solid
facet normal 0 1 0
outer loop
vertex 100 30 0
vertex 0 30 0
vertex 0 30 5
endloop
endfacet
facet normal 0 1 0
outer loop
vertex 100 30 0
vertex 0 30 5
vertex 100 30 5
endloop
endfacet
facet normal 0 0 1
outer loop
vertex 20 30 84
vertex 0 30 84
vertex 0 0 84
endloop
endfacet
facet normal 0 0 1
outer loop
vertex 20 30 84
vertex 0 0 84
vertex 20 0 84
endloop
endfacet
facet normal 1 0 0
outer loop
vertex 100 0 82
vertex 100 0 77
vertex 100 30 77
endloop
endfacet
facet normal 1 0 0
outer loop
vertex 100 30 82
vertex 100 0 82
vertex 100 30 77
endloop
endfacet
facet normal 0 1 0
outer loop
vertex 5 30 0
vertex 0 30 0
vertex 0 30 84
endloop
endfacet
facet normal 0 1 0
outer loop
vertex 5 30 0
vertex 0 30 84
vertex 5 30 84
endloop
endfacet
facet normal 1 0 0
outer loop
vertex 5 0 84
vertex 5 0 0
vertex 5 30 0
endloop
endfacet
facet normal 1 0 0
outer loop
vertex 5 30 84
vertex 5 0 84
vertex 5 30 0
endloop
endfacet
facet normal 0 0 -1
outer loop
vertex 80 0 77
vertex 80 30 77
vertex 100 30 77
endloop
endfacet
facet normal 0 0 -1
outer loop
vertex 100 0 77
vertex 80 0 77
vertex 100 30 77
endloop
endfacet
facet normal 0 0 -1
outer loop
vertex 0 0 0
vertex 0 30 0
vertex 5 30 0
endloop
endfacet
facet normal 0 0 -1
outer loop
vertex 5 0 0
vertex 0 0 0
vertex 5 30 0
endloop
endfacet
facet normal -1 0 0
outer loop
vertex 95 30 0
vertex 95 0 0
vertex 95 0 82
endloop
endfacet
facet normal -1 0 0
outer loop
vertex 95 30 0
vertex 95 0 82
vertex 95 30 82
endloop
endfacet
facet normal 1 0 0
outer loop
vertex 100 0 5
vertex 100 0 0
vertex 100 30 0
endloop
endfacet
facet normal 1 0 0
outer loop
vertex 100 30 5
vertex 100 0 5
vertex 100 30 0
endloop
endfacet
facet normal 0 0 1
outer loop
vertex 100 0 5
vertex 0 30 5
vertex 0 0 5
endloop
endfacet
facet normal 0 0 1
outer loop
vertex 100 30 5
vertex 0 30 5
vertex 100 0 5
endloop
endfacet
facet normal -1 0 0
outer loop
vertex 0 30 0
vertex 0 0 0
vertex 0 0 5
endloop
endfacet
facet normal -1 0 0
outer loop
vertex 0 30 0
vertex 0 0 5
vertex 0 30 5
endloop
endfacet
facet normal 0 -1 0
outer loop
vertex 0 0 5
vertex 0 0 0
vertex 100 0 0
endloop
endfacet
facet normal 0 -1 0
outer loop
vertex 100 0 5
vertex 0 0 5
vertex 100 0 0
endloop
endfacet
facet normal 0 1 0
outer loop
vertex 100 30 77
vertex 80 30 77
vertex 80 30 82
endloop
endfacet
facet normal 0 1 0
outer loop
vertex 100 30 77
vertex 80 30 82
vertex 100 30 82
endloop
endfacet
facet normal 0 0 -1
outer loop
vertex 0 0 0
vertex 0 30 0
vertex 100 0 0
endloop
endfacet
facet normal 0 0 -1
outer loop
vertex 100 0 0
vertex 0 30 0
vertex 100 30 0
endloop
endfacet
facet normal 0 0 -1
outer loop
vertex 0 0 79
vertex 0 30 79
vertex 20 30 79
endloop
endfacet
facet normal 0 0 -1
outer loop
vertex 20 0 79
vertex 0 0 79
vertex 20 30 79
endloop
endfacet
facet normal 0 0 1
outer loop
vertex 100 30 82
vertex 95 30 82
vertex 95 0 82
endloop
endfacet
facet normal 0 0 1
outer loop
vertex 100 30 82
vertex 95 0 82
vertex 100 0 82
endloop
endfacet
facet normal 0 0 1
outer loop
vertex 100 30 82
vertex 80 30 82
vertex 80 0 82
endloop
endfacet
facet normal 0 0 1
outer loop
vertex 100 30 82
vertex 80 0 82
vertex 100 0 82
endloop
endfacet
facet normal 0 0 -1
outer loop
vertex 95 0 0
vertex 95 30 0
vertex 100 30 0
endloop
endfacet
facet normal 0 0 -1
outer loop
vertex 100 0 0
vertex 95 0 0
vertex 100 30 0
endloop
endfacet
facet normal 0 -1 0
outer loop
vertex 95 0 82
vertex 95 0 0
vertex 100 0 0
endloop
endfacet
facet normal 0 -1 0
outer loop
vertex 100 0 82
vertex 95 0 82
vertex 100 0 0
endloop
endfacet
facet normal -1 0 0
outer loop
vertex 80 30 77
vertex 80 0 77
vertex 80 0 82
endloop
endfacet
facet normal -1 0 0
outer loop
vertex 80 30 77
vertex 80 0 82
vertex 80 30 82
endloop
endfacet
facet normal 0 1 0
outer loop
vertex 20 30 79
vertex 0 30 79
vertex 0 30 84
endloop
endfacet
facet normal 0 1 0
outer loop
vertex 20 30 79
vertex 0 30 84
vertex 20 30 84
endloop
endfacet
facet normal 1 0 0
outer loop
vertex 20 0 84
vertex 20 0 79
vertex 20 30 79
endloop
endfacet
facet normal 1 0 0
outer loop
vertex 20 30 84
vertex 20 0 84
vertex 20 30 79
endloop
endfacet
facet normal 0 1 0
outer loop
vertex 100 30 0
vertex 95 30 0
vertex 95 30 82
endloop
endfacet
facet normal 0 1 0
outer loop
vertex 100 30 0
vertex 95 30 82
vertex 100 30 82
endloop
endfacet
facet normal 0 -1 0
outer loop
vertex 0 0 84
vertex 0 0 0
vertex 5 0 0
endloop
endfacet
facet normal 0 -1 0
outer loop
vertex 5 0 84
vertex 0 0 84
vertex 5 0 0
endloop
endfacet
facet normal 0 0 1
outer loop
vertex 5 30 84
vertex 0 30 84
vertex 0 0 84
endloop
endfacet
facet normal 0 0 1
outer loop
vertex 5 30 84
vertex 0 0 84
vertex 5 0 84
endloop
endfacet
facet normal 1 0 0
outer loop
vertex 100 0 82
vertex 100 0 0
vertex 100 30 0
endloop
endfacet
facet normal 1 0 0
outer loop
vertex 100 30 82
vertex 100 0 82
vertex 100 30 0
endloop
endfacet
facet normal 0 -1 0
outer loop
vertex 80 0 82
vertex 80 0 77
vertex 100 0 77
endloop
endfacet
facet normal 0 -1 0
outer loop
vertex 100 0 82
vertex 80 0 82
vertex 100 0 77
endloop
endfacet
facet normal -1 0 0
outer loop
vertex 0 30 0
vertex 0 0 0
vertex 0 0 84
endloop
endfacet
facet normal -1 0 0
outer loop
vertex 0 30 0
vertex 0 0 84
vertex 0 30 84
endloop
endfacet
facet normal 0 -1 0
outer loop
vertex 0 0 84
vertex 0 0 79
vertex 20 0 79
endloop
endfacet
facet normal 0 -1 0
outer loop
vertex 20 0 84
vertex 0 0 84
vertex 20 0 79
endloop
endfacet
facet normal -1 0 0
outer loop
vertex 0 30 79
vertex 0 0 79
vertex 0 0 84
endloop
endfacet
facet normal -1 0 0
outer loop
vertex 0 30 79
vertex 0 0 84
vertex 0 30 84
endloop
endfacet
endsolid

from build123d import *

# Parameters (mm, degrees)
BOX_W        = 100
BOX_H        = 30
BOX_DEPTH    = 5
BOX001_W     = 5
BOX001_H     = 30
BOX001_DEPTH = 84
BOX002_W     = 5
BOX002_H     = 30
BOX002_DEPTH = 82
BOX003_W     = 20
BOX003_H     = 30
BOX003_DEPTH = 5
BOX004_W     = 20
BOX004_H     = 30
BOX004_DEPTH = 5


with BuildPart() as base:
    # Box → Box (new body)
    with BuildSketch(Plane.XY):
        with Locations((50, 15)):
            Rectangle(BOX_W, BOX_H)
    extrude(amount=BOX_DEPTH)


with BuildPart() as side_reciever:
    # Box001 → Box001 (new body)
    with BuildSketch(Plane.XY):
        with Locations((2.5, 15)):
            Rectangle(BOX001_W, BOX001_H)
    extrude(amount=BOX001_DEPTH)


with BuildPart() as side_laser:
    # Box002 → Box002 (new body)
    with BuildSketch(Plane(origin=(95, 0, 0), x_dir=(1, 0, 0), z_dir=(0, 0, 1))):
        with Locations((2.5, 15)):
            Rectangle(BOX002_W, BOX002_H)
    extrude(amount=BOX002_DEPTH)


with BuildPart() as platform_laser:
    # Box003 → Box003 (new body)
    with BuildSketch(Plane(origin=(80, 0, 77), x_dir=(1, 0, 0), z_dir=(0, 0, 1))):
        with Locations((10, 15)):
            Rectangle(BOX003_W, BOX003_H)
    extrude(amount=BOX003_DEPTH)


with BuildPart() as platform_reciever:
    # Box004 → Box004 (new body)
    with BuildSketch(Plane.XY.offset(79)):
        with Locations((10, 15)):
            Rectangle(BOX004_W, BOX004_H)
    extrude(amount=BOX004_DEPTH)


solid = Compound([base.part, side_reciever.part, side_laser.part, platform_laser.part, platform_reciever.part])
